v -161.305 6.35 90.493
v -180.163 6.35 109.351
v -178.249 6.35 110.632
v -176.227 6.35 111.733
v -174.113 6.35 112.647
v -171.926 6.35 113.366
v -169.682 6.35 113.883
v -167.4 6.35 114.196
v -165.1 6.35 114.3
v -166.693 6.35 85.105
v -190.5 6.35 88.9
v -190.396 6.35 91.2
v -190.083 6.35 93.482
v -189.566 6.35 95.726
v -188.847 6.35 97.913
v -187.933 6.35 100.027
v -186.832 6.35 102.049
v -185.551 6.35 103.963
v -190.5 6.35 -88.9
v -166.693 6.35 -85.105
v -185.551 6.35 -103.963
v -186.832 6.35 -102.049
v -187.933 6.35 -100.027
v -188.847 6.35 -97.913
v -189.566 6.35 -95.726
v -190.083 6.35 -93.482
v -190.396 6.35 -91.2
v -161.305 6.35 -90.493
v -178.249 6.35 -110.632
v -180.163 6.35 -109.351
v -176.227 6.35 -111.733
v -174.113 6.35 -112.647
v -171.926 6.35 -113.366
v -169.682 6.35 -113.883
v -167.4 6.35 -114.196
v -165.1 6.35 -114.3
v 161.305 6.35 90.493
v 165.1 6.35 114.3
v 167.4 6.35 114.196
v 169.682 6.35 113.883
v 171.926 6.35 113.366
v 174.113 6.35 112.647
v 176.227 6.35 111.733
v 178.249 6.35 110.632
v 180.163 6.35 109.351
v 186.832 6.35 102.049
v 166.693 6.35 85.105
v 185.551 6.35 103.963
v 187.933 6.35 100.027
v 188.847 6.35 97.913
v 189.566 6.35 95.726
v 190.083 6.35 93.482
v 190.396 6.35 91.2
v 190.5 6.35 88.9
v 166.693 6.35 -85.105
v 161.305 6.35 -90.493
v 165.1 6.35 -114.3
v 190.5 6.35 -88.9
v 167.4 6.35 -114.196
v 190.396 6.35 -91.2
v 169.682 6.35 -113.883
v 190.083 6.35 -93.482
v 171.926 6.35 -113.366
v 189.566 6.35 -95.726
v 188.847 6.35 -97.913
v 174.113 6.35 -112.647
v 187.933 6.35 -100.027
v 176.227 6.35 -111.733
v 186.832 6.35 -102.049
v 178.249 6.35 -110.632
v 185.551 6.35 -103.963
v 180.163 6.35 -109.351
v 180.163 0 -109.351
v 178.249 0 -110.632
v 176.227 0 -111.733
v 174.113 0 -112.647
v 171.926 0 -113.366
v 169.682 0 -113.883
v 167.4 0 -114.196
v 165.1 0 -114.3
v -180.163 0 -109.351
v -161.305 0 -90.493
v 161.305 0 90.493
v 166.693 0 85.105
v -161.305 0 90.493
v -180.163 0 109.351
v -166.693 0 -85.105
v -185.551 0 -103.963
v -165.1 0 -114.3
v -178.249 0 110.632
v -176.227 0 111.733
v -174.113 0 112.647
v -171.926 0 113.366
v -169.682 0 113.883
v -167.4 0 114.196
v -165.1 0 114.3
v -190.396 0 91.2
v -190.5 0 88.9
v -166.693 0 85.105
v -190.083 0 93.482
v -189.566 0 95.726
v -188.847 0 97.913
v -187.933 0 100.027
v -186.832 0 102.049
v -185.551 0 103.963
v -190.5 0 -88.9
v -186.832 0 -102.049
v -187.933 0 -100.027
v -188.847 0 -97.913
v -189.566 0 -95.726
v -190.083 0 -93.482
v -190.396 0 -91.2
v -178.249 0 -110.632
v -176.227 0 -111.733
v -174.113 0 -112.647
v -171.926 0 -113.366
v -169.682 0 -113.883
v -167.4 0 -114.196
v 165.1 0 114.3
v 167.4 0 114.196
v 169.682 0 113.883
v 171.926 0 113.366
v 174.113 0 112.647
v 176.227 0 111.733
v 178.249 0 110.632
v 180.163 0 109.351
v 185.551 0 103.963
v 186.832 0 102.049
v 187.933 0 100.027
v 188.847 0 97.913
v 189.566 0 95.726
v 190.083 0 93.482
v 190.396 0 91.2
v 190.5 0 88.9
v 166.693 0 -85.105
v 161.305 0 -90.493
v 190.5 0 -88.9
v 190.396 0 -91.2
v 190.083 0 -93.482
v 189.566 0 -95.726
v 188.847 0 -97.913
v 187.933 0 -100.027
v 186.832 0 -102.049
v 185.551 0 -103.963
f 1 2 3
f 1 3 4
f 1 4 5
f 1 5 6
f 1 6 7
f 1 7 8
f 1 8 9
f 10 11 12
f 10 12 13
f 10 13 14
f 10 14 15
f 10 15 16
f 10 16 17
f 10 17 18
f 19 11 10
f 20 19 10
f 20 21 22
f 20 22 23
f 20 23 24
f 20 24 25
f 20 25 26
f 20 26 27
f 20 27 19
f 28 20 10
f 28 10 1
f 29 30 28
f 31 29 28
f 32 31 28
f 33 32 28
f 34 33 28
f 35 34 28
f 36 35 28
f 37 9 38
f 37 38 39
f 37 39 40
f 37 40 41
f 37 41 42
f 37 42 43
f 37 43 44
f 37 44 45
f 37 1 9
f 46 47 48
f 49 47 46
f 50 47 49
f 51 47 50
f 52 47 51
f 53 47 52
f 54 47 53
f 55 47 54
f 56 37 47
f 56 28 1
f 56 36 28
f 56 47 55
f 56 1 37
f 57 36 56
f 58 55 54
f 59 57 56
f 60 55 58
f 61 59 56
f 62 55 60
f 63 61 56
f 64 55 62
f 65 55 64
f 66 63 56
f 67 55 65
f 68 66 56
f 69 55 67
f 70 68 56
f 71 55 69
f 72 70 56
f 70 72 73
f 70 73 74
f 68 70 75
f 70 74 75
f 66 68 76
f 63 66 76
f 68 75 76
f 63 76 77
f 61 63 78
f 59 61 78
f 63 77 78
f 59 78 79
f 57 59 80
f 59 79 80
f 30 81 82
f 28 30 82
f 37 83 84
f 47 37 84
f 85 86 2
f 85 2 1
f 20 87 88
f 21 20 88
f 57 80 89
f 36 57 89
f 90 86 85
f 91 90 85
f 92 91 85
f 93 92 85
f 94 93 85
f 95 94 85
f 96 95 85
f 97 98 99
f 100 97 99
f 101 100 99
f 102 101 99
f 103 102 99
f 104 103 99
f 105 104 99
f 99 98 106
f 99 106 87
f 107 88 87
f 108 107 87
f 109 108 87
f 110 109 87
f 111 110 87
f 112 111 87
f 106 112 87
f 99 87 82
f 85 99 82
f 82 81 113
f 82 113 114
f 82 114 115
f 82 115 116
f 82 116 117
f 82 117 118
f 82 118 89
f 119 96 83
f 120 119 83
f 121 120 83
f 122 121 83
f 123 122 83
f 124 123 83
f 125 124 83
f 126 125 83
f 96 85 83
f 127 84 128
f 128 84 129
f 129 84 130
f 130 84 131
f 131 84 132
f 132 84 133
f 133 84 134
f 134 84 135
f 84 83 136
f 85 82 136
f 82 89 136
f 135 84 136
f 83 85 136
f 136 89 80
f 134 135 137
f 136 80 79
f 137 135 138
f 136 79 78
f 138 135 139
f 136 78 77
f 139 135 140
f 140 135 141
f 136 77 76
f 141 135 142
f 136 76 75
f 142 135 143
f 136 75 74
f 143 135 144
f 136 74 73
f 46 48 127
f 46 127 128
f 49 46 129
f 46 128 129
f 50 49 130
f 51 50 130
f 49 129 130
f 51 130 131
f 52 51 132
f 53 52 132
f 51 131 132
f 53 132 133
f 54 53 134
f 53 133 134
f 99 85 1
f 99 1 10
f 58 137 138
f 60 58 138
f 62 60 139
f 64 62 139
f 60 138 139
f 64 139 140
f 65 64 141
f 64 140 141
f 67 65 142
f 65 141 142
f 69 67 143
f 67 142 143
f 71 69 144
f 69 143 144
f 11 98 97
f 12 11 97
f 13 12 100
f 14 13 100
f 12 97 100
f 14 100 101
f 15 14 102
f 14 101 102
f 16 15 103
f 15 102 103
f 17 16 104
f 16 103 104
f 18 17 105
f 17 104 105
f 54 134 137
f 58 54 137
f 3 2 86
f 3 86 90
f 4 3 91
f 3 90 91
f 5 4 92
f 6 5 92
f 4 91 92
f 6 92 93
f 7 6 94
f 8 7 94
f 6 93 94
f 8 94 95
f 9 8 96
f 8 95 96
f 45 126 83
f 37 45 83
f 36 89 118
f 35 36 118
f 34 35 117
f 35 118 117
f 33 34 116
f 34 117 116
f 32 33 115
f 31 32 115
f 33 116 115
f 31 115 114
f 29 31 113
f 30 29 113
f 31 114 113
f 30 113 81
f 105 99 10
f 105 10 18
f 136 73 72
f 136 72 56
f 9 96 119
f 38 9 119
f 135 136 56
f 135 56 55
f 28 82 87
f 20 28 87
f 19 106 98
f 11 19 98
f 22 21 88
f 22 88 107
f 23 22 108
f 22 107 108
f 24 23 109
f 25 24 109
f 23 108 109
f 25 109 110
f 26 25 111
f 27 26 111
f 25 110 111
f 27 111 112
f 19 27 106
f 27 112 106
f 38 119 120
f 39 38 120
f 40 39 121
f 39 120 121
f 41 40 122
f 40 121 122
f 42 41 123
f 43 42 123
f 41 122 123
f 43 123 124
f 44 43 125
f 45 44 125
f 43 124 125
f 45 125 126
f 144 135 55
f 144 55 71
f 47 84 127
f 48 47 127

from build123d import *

# Parameters (mm, degrees)
BASE_SUPPORT_DEPTH = 6.35
CUT_EXTRUDE1_DEPTH = 6.35


with BuildPart() as part:
    # Sketch1 → Base Support (new body)
    with BuildSketch(Plane(origin=(0, 0, 0), x_dir=(1, 0, 0), z_dir=(0, 1, 0))):
        with BuildLine():
            Line((-165.1, -114.3), (165.1, -114.3))
            ThreePointArc((165.1, -114.3), (183.060512242, -106.860512242), (190.5, -88.9))
            Line((190.5, -88.9), (190.5, 88.9))
            ThreePointArc((190.5, 88.9), (183.060512242, 106.860512242), (165.1, 114.3))
            Line((165.1, 114.3), (-165.1, 114.3))
            ThreePointArc((-165.1, 114.3), (-183.060512242, 106.860512242), (-190.5, 88.9))
            Line((-190.5, 88.9), (-190.5, -88.9))
            ThreePointArc((-190.5, -88.9), (-183.060512242, -106.860512242), (-165.1, -114.3))
        make_face()
    extrude(amount=BASE_SUPPORT_DEPTH)

    # Sketch2 → Cut-Extrude1 (cut)
    with BuildSketch(Plane(origin=(0, 0, 0), x_dir=(1, 0, 0), z_dir=(0, 1, 0))):
        with BuildLine():
            Line((-180.16323011, -109.351383783), (-161.304692256, -90.492845929))
            Line((-161.304692256, -90.492845929), (-166.692845929, -85.104692256))
            Line((-166.692845929, -85.104692256), (-185.551383783, -103.96323011))
            ThreePointArc((-185.551383783, -103.96323011), (-183.060512242, -106.860512242), (-180.16323011, -109.351383783))
        make_face()
        with BuildLine():
            Line((161.304692256, -90.492845929), (166.692845929, -85.104692256))
            Line((166.692845929, -85.104692256), (185.551383783, -103.96323011))
            ThreePointArc((185.551383783, -103.96323011), (183.060512242, -106.860512242), (180.16323011, -109.351383783))
            Line((180.16323011, -109.351383783), (161.304692256, -90.492845929))
        make_face()
        with BuildLine():
            Line((180.16323011, 109.351383783), (161.304692256, 90.492845929))
            Line((161.304692256, 90.492845929), (166.692845929, 85.104692256))
            Line((166.692845929, 85.104692256), (185.551383783, 103.96323011))
            ThreePointArc((185.551383783, 103.96323011), (183.060512242, 106.860512242), (180.16323011, 109.351383783))
        make_face()
        with BuildLine():
            Line((-166.692845929, 85.104692256), (-185.551383783, 103.96323011))
            ThreePointArc((-185.551383783, 103.96323011), (-183.060512242, 106.860512242), (-180.16323011, 109.351383783))
            Line((-180.16323011, 109.351383783), (-161.304692256, 90.492845929))
            Line((-161.304692256, 90.492845929), (-166.692845929, 85.104692256))
        make_face()
    extrude(amount=CUT_EXTRUDE1_DEPTH, mode=Mode.SUBTRACT)


solid = part.part
